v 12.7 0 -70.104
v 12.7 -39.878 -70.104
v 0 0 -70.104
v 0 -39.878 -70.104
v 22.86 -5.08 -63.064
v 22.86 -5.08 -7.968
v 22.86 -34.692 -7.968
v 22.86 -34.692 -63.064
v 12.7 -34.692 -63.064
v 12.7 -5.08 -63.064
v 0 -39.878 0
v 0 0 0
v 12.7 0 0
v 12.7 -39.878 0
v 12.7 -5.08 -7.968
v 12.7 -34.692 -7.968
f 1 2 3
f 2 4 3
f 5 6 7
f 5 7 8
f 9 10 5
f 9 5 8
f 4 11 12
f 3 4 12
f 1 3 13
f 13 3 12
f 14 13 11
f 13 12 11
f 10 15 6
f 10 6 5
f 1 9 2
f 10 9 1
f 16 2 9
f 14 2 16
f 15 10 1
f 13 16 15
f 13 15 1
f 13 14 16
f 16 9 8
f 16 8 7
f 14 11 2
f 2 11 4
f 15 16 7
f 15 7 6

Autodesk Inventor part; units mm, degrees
ref_plane "YZ Plane" through (0, 0, 0) normal (1, 0, 0) x (0, 1, 0)
ref_plane "XZ Plane" through (0, 0, 0) normal (0, 1, 0) x (-1, 0, 0)
ref_plane "XY Plane" through (0, 0, 0) normal (0, 0, 1) x (1, 0, 0)
sketch "Sketch1" plane through (0, 0, 0) normal (1, 0, 0) x (0, 1, 0)
  line L0 (0, 0) -> (-39.878, 0)
  line L1 (-39.878, 0) -> (-39.878, -70.104)
  line L2 (-39.878, -70.104) -> (0, -70.104)
  line L3 (0, -70.104) -> (0, 0)
  dimension "d0" = 39.878
  dimension "d1" = 70.104
extrude "Extrusion1" add sketch "Sketch1" along normal blind 12.7
sketch "Sketch2" plane through (12.7, 0, 0) normal (1, 0, 0) x (0, 0, -1)
  line L0 (7.9684, 0) -> (7.9684, -5.08) construction
  line L1 (34.6892, -39.7724) -> (34.6892, -34.6924) construction
  line L2 (34.6892, -39.7724) -> (39.7692, -39.7724) construction
  line L3 (7.9684, -5.08) -> (63.0635, -5.08)
  line L4 (63.0635, -5.08) -> (63.0635, -34.6924)
  line L5 (63.0635, -34.6924) -> (7.9684, -34.6924)
  line L6 (7.9684, -34.6924) -> (7.9684, -5.08)
  point P0 (0, 0)
  dimension "d4" = 5.08
  dimension "d5" = 5.08
  dimension "d6" = 90
extrude "Extrusion2" add sketch "Sketch2" along normal blind 10.16
properties part number "Periph_Screen"
